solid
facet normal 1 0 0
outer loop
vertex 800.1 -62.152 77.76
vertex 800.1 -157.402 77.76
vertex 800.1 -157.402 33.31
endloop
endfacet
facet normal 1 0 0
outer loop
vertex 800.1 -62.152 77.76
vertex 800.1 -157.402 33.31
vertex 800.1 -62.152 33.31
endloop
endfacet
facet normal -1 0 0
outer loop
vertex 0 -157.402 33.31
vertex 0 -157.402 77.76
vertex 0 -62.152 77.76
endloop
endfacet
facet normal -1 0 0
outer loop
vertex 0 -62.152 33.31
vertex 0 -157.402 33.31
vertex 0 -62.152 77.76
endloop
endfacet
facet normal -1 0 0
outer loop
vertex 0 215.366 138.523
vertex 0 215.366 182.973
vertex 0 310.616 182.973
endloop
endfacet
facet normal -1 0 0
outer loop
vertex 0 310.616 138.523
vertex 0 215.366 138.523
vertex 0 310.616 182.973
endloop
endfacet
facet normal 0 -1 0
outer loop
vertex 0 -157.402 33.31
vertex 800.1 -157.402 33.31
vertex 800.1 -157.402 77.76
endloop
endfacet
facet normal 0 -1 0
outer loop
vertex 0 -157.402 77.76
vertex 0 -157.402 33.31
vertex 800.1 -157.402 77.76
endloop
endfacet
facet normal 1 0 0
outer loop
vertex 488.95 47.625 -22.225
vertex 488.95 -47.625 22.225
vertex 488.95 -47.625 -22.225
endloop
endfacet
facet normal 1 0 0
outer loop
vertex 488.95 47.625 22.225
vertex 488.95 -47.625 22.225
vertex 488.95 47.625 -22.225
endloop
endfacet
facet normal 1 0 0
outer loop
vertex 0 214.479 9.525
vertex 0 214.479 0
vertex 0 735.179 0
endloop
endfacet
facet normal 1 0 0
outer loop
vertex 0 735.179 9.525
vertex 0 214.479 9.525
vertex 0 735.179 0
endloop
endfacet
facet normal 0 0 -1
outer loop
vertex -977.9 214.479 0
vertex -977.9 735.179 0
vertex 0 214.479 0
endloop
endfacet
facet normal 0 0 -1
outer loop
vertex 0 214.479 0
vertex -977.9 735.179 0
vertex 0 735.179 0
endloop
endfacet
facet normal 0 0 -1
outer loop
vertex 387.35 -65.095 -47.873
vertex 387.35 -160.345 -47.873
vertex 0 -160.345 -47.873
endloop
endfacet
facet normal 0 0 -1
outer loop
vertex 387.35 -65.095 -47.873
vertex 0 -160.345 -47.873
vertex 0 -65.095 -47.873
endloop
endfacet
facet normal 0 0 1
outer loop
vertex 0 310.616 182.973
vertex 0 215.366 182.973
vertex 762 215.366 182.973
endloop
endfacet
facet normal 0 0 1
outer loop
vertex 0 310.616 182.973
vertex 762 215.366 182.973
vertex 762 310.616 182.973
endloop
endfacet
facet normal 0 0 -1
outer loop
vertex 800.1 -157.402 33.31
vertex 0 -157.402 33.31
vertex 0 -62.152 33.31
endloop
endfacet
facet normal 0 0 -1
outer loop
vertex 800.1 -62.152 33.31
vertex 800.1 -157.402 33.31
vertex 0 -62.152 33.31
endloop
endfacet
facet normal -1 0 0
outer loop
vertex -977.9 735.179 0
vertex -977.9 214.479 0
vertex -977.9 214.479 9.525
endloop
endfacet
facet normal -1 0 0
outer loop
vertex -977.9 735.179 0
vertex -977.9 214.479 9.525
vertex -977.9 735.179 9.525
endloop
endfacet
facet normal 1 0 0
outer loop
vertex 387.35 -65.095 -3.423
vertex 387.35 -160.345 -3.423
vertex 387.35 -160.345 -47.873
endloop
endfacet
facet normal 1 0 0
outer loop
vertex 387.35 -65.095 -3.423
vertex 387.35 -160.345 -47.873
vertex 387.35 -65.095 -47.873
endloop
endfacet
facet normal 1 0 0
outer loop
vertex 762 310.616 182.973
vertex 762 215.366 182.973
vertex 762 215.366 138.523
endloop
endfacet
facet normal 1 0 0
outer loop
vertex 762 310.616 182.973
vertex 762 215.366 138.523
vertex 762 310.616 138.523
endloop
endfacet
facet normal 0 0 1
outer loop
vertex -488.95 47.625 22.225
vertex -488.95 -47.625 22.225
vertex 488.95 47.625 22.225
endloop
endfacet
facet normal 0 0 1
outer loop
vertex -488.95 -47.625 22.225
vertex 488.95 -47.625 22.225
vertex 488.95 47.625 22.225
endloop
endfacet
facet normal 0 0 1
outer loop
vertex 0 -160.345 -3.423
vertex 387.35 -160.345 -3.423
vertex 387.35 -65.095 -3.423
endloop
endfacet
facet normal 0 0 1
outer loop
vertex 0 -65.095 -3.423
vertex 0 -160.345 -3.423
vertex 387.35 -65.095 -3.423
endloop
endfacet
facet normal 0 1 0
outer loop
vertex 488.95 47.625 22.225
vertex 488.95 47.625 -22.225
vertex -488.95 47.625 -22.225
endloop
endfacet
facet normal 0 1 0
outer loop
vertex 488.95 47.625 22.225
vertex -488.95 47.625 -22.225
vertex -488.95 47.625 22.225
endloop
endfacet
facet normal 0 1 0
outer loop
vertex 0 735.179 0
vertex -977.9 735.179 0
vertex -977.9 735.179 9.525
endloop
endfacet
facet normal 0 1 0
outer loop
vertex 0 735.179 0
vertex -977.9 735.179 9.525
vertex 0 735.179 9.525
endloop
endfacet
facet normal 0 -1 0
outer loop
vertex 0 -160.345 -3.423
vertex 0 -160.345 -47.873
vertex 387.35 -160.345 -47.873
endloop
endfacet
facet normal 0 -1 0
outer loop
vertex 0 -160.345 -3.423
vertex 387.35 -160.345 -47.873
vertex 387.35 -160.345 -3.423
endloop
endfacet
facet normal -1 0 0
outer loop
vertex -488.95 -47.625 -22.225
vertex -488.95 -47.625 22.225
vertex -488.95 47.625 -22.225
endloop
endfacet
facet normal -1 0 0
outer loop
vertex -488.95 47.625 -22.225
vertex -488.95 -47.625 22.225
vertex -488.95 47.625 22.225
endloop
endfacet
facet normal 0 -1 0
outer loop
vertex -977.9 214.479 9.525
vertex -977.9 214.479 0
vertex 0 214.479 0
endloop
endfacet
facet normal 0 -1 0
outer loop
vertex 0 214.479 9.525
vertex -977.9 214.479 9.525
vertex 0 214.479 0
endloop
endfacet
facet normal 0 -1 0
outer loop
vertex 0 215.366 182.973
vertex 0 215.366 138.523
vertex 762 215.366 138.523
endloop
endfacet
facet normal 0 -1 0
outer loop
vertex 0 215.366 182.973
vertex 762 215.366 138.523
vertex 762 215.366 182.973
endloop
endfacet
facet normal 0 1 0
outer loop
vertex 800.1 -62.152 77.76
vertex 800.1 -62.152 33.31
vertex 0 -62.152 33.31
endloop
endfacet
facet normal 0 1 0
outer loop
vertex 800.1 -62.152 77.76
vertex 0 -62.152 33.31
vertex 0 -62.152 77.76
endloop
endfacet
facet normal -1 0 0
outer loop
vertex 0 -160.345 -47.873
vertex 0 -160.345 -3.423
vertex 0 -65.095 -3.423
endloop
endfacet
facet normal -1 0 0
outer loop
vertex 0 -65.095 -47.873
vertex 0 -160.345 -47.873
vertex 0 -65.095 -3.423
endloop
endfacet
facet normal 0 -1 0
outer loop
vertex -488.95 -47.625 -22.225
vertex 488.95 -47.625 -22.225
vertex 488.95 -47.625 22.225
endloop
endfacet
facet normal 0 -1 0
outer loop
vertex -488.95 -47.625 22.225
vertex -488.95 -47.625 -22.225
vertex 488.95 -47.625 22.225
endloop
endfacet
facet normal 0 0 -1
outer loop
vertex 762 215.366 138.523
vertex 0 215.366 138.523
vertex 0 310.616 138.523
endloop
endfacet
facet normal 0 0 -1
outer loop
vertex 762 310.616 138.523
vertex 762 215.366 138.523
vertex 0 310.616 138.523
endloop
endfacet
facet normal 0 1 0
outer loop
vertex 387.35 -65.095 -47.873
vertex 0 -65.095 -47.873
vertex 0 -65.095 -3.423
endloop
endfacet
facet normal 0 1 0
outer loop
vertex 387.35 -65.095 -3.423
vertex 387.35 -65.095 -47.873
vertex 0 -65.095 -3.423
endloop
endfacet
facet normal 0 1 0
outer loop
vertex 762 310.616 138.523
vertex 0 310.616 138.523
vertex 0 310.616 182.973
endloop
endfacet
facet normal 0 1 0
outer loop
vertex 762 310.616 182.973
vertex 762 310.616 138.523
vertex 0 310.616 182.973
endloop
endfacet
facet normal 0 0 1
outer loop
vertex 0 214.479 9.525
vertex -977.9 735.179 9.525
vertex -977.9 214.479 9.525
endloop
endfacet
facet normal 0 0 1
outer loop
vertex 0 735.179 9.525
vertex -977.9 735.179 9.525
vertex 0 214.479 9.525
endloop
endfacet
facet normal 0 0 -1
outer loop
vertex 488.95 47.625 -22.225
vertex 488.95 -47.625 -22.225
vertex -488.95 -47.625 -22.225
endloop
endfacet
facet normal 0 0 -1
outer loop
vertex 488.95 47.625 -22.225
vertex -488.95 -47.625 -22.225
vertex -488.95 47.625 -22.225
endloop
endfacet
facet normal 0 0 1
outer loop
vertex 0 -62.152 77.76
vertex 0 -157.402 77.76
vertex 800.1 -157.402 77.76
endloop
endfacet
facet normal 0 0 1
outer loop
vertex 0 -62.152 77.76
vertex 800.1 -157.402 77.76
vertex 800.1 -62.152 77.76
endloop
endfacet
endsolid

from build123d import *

# Parameters (mm, degrees)
F0_W     = 95.25
F0_H     = 44.45
F1_DEPTH = 488.95
F2_W     = 95.25
F2_H     = 44.45
F3_DEPTH = 762
F4_W     = 95.25
F4_H     = 44.45
F5_DEPTH = 800.1
F6_W     = 95.25
F6_H     = 44.45
F7_DEPTH = 387.35
F8_W     = 977.9
F8_H     = 520.7
F9_DEPTH = 9.525


with BuildPart() as f1:
    # F0 (on Right) → F1 (new body, symmetric)
    with BuildSketch(Plane.YZ):
        Rectangle(F0_W, F0_H)
    extrude(amount=F1_DEPTH, both=True)


with BuildPart() as f3:
    # F2 (on Right) → F3 (new body)
    with BuildSketch(Plane.YZ):
        with Locations((262.991309, 160.748305)):
            Rectangle(F2_W, F2_H)
    extrude(amount=F3_DEPTH)


with BuildPart() as f5:
    # F4 (on Right) → F5 (new body)
    with BuildSketch(Plane.YZ):
        with Locations((-109.776534, 55.535162)):
            Rectangle(F4_W, F4_H)
    extrude(amount=F5_DEPTH)


with BuildPart() as f7:
    # F6 (on Right) → F7 (new body)
    with BuildSketch(Plane.YZ):
        with Locations((-112.719905, -25.647794)):
            Rectangle(F6_W, F6_H)
    extrude(amount=F7_DEPTH)


with BuildPart() as f9:
    # F8 (on Top) → F9 (new body)
    with BuildSketch(Plane.XY):
        with Locations((-488.95, 474.829476)):
            Rectangle(F8_W, F8_H)
    extrude(amount=F9_DEPTH)


solid = Compound([f1.part, f3.part, f5.part, f7.part, f9.part])
